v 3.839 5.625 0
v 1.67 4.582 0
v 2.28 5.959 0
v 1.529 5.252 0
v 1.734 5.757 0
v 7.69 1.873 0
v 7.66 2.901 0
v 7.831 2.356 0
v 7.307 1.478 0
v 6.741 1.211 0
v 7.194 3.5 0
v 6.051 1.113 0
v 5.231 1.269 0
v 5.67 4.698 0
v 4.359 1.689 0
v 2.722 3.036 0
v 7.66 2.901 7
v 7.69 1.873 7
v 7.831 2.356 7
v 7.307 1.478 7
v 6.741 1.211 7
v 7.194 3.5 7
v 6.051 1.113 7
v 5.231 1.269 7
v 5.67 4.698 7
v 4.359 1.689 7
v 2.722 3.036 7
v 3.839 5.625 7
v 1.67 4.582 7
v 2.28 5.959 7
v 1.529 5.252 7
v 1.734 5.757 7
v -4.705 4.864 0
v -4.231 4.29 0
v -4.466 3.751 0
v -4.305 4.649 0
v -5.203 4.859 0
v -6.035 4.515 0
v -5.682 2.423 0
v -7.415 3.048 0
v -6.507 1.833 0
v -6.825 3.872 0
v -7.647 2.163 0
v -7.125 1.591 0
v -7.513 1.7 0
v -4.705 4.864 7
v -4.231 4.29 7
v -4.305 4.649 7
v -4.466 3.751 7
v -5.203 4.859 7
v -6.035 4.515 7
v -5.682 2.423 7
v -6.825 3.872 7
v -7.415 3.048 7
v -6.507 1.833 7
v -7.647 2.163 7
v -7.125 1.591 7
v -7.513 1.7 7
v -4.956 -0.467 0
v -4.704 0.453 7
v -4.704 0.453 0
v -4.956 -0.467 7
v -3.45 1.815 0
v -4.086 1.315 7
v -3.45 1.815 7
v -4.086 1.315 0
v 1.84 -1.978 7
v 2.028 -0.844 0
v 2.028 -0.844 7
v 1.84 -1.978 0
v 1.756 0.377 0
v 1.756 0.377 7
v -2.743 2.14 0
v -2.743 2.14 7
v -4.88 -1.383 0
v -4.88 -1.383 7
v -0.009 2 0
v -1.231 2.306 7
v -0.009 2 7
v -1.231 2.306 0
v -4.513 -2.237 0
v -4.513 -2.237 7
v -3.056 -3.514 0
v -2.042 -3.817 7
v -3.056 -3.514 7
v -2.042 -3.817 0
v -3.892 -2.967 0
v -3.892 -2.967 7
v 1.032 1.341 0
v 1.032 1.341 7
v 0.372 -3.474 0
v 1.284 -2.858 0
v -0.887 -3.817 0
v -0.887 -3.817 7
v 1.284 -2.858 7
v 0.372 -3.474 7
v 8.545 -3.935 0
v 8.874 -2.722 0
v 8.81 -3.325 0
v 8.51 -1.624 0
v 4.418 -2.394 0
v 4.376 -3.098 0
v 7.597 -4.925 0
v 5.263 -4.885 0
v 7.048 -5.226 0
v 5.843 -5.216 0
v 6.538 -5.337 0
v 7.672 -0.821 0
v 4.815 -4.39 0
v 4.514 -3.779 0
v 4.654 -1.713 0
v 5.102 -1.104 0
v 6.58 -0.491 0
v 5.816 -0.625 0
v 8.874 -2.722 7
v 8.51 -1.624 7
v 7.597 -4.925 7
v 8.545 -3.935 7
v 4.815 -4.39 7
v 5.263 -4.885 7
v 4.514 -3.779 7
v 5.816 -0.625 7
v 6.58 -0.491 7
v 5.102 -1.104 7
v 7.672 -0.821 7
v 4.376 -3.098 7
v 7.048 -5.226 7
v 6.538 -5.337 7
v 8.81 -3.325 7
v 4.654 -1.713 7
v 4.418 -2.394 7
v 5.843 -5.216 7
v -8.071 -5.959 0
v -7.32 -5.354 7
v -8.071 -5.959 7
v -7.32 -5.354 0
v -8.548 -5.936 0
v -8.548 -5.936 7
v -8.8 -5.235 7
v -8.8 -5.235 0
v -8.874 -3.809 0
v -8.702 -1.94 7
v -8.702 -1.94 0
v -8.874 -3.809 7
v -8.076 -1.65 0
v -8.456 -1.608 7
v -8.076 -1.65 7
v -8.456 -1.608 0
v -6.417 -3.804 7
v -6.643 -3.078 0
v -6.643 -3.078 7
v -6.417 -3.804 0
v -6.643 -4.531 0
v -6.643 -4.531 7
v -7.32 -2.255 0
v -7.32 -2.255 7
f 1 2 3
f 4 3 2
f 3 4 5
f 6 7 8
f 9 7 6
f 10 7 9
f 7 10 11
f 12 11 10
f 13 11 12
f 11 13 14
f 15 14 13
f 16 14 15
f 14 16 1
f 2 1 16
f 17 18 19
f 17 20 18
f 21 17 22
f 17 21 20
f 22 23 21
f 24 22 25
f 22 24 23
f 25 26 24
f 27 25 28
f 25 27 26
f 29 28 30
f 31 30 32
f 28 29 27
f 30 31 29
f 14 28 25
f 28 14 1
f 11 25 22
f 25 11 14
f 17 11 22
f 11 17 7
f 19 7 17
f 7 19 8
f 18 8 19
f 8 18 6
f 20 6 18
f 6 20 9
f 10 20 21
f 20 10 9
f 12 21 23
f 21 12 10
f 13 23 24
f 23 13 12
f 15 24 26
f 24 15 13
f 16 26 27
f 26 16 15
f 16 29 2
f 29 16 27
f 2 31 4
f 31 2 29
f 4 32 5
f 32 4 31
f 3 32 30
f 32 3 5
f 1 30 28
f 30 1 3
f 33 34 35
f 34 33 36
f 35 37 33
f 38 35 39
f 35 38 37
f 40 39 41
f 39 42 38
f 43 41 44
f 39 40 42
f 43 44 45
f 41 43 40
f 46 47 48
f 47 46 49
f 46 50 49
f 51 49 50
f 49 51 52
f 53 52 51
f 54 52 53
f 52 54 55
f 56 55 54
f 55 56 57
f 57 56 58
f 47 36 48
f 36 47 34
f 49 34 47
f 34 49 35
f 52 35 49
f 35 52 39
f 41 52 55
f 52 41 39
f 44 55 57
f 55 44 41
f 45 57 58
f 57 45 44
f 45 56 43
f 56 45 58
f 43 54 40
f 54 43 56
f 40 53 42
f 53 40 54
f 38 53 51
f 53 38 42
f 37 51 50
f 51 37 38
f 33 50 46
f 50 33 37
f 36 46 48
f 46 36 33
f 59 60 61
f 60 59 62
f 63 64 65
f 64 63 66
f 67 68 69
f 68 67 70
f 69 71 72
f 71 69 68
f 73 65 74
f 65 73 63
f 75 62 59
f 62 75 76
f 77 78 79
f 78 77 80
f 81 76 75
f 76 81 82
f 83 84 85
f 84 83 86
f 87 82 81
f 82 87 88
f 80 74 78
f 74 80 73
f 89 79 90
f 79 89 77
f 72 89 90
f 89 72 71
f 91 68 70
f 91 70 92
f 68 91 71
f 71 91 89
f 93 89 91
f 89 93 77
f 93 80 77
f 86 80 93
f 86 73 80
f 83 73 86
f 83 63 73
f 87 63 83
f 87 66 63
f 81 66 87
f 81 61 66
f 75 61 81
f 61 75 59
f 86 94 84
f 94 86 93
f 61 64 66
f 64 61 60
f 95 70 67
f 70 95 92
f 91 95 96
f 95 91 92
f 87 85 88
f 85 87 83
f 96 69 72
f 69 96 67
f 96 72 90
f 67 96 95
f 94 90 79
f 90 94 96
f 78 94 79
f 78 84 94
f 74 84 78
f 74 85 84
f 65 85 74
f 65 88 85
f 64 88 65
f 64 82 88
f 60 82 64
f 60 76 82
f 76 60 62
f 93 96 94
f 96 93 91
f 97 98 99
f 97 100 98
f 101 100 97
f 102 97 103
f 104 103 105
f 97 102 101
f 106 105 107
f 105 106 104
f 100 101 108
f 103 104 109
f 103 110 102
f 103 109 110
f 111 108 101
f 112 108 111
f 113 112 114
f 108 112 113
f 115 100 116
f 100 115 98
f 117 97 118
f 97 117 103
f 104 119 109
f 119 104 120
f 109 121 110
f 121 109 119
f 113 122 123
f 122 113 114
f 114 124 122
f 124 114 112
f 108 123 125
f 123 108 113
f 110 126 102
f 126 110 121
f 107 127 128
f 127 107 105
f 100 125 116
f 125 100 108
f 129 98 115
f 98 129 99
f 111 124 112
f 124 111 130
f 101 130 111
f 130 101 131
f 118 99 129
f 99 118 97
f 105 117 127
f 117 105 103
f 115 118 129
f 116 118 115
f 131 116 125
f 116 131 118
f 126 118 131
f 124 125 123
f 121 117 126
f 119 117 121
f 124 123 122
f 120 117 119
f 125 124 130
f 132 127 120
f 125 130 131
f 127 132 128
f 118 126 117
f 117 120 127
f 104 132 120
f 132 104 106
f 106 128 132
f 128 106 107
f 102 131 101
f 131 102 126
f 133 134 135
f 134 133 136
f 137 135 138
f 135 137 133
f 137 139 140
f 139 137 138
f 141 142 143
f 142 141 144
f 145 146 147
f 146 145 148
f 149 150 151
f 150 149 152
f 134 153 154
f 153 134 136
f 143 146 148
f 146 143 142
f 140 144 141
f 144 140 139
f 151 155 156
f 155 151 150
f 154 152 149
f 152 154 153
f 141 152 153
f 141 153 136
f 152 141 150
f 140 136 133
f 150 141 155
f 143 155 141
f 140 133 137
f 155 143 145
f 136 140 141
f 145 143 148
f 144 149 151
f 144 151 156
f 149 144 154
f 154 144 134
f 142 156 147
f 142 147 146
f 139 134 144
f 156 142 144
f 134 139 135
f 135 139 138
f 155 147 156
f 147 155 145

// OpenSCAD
// Module names are of the form poly_<inkscape-path-id>().  As a result,
// you can associate a polygon in this OpenSCAD program with the corresponding
// SVG element in the Inkscape document by looking for the XML element with
// the attribute id="inkscape-path-id".

// fudge value is used to ensure that subtracted solids are a tad taller
// in the z dimension than the polygon being subtracted from.  This helps
// keep the resulting .stl file manifold.
fudge = 0.1;

module poly_path41505(h)
{
  scale([25.4/90, -25.4/90, 1]) union()
  {
    linear_extrude(height=h)
      polygon([[8.077628,-21.114641],[6.143303,-20.400503],[5.417864,-18.609448],[5.916279,-16.236432],[9.644076,-10.756421],[15.445503,-5.984284],[18.535957,-4.496110],[21.439372,-3.943836],[23.886177,-4.290913],[25.892521,-5.236402],[27.249514,-6.636684],[27.748265,-8.348144],[27.141367,-10.279882],[25.491841,-12.402075],[20.091915,-16.644962],[13.602505,-19.931083],[8.077628,-21.114717]]);
    linear_extrude(height=h)
      polygon([[-18.437542,-17.216230],[-21.383785,-15.997024],[-24.183592,-13.718734],[-26.275336,-10.801038],[-27.097390,-7.663612],[-26.620230,-6.022064],[-25.244665,-5.636264],[-23.054568,-6.494782],[-20.133812,-8.586185],[-15.825208,-13.290351],[-14.991698,-15.201932],[-15.253346,-16.472306],[-16.670576,-17.233124],[-18.437542,-17.216307]]);
    linear_extrude(height=h)
      polygon([[-4.361586,-8.169526],[-9.718830,-7.582711],[-12.224646,-6.430887],[-14.479618,-4.657973],[-16.668301,-1.604160],[-17.560941,1.653078],[-17.290422,4.900461],[-15.989631,7.924708],[-13.791455,10.512539],[-10.828780,12.450672],[-7.234491,13.525827],[-3.141474,13.524723],[1.316706,12.310193],[4.550306,10.126187],[6.519599,7.007783],[7.184858,2.990062],[6.222002,-1.336842],[3.655038,-4.751319],[-0.033627,-7.085002],[-4.361586,-8.169526]]);
    linear_extrude(height=h)
      polygon([[23.314184,1.740191],[20.609181,2.215836],[18.076619,3.912589],[16.491320,6.071431],[15.653685,8.481308],[15.507224,10.976125],[15.995447,13.389791],[17.061866,15.556213],[18.649990,17.309295],[20.703331,18.482947],[23.165398,18.911073],[24.974589,18.518892],[26.919640,17.451113],[30.277763,13.941336],[31.215131,11.782236],[31.442186,9.645178],[30.152942,5.755363],[27.185214,2.908249],[23.314184,1.740191]]);
    linear_extrude(height=h)
      polygon([[-28.615089,5.846916],[-29.960749,5.696102],[-30.832127,6.874800],[-31.442186,13.494950],[-31.181903,18.550094],[-30.289316,21.032284],[-28.596815,21.114717],[-25.936792,18.970587],[-23.537035,16.054923],[-22.737116,13.480072],[-23.537035,10.905222],[-25.936792,7.989557],[-28.615089,5.846916]]);
  }
}

poly_path41505(7);
